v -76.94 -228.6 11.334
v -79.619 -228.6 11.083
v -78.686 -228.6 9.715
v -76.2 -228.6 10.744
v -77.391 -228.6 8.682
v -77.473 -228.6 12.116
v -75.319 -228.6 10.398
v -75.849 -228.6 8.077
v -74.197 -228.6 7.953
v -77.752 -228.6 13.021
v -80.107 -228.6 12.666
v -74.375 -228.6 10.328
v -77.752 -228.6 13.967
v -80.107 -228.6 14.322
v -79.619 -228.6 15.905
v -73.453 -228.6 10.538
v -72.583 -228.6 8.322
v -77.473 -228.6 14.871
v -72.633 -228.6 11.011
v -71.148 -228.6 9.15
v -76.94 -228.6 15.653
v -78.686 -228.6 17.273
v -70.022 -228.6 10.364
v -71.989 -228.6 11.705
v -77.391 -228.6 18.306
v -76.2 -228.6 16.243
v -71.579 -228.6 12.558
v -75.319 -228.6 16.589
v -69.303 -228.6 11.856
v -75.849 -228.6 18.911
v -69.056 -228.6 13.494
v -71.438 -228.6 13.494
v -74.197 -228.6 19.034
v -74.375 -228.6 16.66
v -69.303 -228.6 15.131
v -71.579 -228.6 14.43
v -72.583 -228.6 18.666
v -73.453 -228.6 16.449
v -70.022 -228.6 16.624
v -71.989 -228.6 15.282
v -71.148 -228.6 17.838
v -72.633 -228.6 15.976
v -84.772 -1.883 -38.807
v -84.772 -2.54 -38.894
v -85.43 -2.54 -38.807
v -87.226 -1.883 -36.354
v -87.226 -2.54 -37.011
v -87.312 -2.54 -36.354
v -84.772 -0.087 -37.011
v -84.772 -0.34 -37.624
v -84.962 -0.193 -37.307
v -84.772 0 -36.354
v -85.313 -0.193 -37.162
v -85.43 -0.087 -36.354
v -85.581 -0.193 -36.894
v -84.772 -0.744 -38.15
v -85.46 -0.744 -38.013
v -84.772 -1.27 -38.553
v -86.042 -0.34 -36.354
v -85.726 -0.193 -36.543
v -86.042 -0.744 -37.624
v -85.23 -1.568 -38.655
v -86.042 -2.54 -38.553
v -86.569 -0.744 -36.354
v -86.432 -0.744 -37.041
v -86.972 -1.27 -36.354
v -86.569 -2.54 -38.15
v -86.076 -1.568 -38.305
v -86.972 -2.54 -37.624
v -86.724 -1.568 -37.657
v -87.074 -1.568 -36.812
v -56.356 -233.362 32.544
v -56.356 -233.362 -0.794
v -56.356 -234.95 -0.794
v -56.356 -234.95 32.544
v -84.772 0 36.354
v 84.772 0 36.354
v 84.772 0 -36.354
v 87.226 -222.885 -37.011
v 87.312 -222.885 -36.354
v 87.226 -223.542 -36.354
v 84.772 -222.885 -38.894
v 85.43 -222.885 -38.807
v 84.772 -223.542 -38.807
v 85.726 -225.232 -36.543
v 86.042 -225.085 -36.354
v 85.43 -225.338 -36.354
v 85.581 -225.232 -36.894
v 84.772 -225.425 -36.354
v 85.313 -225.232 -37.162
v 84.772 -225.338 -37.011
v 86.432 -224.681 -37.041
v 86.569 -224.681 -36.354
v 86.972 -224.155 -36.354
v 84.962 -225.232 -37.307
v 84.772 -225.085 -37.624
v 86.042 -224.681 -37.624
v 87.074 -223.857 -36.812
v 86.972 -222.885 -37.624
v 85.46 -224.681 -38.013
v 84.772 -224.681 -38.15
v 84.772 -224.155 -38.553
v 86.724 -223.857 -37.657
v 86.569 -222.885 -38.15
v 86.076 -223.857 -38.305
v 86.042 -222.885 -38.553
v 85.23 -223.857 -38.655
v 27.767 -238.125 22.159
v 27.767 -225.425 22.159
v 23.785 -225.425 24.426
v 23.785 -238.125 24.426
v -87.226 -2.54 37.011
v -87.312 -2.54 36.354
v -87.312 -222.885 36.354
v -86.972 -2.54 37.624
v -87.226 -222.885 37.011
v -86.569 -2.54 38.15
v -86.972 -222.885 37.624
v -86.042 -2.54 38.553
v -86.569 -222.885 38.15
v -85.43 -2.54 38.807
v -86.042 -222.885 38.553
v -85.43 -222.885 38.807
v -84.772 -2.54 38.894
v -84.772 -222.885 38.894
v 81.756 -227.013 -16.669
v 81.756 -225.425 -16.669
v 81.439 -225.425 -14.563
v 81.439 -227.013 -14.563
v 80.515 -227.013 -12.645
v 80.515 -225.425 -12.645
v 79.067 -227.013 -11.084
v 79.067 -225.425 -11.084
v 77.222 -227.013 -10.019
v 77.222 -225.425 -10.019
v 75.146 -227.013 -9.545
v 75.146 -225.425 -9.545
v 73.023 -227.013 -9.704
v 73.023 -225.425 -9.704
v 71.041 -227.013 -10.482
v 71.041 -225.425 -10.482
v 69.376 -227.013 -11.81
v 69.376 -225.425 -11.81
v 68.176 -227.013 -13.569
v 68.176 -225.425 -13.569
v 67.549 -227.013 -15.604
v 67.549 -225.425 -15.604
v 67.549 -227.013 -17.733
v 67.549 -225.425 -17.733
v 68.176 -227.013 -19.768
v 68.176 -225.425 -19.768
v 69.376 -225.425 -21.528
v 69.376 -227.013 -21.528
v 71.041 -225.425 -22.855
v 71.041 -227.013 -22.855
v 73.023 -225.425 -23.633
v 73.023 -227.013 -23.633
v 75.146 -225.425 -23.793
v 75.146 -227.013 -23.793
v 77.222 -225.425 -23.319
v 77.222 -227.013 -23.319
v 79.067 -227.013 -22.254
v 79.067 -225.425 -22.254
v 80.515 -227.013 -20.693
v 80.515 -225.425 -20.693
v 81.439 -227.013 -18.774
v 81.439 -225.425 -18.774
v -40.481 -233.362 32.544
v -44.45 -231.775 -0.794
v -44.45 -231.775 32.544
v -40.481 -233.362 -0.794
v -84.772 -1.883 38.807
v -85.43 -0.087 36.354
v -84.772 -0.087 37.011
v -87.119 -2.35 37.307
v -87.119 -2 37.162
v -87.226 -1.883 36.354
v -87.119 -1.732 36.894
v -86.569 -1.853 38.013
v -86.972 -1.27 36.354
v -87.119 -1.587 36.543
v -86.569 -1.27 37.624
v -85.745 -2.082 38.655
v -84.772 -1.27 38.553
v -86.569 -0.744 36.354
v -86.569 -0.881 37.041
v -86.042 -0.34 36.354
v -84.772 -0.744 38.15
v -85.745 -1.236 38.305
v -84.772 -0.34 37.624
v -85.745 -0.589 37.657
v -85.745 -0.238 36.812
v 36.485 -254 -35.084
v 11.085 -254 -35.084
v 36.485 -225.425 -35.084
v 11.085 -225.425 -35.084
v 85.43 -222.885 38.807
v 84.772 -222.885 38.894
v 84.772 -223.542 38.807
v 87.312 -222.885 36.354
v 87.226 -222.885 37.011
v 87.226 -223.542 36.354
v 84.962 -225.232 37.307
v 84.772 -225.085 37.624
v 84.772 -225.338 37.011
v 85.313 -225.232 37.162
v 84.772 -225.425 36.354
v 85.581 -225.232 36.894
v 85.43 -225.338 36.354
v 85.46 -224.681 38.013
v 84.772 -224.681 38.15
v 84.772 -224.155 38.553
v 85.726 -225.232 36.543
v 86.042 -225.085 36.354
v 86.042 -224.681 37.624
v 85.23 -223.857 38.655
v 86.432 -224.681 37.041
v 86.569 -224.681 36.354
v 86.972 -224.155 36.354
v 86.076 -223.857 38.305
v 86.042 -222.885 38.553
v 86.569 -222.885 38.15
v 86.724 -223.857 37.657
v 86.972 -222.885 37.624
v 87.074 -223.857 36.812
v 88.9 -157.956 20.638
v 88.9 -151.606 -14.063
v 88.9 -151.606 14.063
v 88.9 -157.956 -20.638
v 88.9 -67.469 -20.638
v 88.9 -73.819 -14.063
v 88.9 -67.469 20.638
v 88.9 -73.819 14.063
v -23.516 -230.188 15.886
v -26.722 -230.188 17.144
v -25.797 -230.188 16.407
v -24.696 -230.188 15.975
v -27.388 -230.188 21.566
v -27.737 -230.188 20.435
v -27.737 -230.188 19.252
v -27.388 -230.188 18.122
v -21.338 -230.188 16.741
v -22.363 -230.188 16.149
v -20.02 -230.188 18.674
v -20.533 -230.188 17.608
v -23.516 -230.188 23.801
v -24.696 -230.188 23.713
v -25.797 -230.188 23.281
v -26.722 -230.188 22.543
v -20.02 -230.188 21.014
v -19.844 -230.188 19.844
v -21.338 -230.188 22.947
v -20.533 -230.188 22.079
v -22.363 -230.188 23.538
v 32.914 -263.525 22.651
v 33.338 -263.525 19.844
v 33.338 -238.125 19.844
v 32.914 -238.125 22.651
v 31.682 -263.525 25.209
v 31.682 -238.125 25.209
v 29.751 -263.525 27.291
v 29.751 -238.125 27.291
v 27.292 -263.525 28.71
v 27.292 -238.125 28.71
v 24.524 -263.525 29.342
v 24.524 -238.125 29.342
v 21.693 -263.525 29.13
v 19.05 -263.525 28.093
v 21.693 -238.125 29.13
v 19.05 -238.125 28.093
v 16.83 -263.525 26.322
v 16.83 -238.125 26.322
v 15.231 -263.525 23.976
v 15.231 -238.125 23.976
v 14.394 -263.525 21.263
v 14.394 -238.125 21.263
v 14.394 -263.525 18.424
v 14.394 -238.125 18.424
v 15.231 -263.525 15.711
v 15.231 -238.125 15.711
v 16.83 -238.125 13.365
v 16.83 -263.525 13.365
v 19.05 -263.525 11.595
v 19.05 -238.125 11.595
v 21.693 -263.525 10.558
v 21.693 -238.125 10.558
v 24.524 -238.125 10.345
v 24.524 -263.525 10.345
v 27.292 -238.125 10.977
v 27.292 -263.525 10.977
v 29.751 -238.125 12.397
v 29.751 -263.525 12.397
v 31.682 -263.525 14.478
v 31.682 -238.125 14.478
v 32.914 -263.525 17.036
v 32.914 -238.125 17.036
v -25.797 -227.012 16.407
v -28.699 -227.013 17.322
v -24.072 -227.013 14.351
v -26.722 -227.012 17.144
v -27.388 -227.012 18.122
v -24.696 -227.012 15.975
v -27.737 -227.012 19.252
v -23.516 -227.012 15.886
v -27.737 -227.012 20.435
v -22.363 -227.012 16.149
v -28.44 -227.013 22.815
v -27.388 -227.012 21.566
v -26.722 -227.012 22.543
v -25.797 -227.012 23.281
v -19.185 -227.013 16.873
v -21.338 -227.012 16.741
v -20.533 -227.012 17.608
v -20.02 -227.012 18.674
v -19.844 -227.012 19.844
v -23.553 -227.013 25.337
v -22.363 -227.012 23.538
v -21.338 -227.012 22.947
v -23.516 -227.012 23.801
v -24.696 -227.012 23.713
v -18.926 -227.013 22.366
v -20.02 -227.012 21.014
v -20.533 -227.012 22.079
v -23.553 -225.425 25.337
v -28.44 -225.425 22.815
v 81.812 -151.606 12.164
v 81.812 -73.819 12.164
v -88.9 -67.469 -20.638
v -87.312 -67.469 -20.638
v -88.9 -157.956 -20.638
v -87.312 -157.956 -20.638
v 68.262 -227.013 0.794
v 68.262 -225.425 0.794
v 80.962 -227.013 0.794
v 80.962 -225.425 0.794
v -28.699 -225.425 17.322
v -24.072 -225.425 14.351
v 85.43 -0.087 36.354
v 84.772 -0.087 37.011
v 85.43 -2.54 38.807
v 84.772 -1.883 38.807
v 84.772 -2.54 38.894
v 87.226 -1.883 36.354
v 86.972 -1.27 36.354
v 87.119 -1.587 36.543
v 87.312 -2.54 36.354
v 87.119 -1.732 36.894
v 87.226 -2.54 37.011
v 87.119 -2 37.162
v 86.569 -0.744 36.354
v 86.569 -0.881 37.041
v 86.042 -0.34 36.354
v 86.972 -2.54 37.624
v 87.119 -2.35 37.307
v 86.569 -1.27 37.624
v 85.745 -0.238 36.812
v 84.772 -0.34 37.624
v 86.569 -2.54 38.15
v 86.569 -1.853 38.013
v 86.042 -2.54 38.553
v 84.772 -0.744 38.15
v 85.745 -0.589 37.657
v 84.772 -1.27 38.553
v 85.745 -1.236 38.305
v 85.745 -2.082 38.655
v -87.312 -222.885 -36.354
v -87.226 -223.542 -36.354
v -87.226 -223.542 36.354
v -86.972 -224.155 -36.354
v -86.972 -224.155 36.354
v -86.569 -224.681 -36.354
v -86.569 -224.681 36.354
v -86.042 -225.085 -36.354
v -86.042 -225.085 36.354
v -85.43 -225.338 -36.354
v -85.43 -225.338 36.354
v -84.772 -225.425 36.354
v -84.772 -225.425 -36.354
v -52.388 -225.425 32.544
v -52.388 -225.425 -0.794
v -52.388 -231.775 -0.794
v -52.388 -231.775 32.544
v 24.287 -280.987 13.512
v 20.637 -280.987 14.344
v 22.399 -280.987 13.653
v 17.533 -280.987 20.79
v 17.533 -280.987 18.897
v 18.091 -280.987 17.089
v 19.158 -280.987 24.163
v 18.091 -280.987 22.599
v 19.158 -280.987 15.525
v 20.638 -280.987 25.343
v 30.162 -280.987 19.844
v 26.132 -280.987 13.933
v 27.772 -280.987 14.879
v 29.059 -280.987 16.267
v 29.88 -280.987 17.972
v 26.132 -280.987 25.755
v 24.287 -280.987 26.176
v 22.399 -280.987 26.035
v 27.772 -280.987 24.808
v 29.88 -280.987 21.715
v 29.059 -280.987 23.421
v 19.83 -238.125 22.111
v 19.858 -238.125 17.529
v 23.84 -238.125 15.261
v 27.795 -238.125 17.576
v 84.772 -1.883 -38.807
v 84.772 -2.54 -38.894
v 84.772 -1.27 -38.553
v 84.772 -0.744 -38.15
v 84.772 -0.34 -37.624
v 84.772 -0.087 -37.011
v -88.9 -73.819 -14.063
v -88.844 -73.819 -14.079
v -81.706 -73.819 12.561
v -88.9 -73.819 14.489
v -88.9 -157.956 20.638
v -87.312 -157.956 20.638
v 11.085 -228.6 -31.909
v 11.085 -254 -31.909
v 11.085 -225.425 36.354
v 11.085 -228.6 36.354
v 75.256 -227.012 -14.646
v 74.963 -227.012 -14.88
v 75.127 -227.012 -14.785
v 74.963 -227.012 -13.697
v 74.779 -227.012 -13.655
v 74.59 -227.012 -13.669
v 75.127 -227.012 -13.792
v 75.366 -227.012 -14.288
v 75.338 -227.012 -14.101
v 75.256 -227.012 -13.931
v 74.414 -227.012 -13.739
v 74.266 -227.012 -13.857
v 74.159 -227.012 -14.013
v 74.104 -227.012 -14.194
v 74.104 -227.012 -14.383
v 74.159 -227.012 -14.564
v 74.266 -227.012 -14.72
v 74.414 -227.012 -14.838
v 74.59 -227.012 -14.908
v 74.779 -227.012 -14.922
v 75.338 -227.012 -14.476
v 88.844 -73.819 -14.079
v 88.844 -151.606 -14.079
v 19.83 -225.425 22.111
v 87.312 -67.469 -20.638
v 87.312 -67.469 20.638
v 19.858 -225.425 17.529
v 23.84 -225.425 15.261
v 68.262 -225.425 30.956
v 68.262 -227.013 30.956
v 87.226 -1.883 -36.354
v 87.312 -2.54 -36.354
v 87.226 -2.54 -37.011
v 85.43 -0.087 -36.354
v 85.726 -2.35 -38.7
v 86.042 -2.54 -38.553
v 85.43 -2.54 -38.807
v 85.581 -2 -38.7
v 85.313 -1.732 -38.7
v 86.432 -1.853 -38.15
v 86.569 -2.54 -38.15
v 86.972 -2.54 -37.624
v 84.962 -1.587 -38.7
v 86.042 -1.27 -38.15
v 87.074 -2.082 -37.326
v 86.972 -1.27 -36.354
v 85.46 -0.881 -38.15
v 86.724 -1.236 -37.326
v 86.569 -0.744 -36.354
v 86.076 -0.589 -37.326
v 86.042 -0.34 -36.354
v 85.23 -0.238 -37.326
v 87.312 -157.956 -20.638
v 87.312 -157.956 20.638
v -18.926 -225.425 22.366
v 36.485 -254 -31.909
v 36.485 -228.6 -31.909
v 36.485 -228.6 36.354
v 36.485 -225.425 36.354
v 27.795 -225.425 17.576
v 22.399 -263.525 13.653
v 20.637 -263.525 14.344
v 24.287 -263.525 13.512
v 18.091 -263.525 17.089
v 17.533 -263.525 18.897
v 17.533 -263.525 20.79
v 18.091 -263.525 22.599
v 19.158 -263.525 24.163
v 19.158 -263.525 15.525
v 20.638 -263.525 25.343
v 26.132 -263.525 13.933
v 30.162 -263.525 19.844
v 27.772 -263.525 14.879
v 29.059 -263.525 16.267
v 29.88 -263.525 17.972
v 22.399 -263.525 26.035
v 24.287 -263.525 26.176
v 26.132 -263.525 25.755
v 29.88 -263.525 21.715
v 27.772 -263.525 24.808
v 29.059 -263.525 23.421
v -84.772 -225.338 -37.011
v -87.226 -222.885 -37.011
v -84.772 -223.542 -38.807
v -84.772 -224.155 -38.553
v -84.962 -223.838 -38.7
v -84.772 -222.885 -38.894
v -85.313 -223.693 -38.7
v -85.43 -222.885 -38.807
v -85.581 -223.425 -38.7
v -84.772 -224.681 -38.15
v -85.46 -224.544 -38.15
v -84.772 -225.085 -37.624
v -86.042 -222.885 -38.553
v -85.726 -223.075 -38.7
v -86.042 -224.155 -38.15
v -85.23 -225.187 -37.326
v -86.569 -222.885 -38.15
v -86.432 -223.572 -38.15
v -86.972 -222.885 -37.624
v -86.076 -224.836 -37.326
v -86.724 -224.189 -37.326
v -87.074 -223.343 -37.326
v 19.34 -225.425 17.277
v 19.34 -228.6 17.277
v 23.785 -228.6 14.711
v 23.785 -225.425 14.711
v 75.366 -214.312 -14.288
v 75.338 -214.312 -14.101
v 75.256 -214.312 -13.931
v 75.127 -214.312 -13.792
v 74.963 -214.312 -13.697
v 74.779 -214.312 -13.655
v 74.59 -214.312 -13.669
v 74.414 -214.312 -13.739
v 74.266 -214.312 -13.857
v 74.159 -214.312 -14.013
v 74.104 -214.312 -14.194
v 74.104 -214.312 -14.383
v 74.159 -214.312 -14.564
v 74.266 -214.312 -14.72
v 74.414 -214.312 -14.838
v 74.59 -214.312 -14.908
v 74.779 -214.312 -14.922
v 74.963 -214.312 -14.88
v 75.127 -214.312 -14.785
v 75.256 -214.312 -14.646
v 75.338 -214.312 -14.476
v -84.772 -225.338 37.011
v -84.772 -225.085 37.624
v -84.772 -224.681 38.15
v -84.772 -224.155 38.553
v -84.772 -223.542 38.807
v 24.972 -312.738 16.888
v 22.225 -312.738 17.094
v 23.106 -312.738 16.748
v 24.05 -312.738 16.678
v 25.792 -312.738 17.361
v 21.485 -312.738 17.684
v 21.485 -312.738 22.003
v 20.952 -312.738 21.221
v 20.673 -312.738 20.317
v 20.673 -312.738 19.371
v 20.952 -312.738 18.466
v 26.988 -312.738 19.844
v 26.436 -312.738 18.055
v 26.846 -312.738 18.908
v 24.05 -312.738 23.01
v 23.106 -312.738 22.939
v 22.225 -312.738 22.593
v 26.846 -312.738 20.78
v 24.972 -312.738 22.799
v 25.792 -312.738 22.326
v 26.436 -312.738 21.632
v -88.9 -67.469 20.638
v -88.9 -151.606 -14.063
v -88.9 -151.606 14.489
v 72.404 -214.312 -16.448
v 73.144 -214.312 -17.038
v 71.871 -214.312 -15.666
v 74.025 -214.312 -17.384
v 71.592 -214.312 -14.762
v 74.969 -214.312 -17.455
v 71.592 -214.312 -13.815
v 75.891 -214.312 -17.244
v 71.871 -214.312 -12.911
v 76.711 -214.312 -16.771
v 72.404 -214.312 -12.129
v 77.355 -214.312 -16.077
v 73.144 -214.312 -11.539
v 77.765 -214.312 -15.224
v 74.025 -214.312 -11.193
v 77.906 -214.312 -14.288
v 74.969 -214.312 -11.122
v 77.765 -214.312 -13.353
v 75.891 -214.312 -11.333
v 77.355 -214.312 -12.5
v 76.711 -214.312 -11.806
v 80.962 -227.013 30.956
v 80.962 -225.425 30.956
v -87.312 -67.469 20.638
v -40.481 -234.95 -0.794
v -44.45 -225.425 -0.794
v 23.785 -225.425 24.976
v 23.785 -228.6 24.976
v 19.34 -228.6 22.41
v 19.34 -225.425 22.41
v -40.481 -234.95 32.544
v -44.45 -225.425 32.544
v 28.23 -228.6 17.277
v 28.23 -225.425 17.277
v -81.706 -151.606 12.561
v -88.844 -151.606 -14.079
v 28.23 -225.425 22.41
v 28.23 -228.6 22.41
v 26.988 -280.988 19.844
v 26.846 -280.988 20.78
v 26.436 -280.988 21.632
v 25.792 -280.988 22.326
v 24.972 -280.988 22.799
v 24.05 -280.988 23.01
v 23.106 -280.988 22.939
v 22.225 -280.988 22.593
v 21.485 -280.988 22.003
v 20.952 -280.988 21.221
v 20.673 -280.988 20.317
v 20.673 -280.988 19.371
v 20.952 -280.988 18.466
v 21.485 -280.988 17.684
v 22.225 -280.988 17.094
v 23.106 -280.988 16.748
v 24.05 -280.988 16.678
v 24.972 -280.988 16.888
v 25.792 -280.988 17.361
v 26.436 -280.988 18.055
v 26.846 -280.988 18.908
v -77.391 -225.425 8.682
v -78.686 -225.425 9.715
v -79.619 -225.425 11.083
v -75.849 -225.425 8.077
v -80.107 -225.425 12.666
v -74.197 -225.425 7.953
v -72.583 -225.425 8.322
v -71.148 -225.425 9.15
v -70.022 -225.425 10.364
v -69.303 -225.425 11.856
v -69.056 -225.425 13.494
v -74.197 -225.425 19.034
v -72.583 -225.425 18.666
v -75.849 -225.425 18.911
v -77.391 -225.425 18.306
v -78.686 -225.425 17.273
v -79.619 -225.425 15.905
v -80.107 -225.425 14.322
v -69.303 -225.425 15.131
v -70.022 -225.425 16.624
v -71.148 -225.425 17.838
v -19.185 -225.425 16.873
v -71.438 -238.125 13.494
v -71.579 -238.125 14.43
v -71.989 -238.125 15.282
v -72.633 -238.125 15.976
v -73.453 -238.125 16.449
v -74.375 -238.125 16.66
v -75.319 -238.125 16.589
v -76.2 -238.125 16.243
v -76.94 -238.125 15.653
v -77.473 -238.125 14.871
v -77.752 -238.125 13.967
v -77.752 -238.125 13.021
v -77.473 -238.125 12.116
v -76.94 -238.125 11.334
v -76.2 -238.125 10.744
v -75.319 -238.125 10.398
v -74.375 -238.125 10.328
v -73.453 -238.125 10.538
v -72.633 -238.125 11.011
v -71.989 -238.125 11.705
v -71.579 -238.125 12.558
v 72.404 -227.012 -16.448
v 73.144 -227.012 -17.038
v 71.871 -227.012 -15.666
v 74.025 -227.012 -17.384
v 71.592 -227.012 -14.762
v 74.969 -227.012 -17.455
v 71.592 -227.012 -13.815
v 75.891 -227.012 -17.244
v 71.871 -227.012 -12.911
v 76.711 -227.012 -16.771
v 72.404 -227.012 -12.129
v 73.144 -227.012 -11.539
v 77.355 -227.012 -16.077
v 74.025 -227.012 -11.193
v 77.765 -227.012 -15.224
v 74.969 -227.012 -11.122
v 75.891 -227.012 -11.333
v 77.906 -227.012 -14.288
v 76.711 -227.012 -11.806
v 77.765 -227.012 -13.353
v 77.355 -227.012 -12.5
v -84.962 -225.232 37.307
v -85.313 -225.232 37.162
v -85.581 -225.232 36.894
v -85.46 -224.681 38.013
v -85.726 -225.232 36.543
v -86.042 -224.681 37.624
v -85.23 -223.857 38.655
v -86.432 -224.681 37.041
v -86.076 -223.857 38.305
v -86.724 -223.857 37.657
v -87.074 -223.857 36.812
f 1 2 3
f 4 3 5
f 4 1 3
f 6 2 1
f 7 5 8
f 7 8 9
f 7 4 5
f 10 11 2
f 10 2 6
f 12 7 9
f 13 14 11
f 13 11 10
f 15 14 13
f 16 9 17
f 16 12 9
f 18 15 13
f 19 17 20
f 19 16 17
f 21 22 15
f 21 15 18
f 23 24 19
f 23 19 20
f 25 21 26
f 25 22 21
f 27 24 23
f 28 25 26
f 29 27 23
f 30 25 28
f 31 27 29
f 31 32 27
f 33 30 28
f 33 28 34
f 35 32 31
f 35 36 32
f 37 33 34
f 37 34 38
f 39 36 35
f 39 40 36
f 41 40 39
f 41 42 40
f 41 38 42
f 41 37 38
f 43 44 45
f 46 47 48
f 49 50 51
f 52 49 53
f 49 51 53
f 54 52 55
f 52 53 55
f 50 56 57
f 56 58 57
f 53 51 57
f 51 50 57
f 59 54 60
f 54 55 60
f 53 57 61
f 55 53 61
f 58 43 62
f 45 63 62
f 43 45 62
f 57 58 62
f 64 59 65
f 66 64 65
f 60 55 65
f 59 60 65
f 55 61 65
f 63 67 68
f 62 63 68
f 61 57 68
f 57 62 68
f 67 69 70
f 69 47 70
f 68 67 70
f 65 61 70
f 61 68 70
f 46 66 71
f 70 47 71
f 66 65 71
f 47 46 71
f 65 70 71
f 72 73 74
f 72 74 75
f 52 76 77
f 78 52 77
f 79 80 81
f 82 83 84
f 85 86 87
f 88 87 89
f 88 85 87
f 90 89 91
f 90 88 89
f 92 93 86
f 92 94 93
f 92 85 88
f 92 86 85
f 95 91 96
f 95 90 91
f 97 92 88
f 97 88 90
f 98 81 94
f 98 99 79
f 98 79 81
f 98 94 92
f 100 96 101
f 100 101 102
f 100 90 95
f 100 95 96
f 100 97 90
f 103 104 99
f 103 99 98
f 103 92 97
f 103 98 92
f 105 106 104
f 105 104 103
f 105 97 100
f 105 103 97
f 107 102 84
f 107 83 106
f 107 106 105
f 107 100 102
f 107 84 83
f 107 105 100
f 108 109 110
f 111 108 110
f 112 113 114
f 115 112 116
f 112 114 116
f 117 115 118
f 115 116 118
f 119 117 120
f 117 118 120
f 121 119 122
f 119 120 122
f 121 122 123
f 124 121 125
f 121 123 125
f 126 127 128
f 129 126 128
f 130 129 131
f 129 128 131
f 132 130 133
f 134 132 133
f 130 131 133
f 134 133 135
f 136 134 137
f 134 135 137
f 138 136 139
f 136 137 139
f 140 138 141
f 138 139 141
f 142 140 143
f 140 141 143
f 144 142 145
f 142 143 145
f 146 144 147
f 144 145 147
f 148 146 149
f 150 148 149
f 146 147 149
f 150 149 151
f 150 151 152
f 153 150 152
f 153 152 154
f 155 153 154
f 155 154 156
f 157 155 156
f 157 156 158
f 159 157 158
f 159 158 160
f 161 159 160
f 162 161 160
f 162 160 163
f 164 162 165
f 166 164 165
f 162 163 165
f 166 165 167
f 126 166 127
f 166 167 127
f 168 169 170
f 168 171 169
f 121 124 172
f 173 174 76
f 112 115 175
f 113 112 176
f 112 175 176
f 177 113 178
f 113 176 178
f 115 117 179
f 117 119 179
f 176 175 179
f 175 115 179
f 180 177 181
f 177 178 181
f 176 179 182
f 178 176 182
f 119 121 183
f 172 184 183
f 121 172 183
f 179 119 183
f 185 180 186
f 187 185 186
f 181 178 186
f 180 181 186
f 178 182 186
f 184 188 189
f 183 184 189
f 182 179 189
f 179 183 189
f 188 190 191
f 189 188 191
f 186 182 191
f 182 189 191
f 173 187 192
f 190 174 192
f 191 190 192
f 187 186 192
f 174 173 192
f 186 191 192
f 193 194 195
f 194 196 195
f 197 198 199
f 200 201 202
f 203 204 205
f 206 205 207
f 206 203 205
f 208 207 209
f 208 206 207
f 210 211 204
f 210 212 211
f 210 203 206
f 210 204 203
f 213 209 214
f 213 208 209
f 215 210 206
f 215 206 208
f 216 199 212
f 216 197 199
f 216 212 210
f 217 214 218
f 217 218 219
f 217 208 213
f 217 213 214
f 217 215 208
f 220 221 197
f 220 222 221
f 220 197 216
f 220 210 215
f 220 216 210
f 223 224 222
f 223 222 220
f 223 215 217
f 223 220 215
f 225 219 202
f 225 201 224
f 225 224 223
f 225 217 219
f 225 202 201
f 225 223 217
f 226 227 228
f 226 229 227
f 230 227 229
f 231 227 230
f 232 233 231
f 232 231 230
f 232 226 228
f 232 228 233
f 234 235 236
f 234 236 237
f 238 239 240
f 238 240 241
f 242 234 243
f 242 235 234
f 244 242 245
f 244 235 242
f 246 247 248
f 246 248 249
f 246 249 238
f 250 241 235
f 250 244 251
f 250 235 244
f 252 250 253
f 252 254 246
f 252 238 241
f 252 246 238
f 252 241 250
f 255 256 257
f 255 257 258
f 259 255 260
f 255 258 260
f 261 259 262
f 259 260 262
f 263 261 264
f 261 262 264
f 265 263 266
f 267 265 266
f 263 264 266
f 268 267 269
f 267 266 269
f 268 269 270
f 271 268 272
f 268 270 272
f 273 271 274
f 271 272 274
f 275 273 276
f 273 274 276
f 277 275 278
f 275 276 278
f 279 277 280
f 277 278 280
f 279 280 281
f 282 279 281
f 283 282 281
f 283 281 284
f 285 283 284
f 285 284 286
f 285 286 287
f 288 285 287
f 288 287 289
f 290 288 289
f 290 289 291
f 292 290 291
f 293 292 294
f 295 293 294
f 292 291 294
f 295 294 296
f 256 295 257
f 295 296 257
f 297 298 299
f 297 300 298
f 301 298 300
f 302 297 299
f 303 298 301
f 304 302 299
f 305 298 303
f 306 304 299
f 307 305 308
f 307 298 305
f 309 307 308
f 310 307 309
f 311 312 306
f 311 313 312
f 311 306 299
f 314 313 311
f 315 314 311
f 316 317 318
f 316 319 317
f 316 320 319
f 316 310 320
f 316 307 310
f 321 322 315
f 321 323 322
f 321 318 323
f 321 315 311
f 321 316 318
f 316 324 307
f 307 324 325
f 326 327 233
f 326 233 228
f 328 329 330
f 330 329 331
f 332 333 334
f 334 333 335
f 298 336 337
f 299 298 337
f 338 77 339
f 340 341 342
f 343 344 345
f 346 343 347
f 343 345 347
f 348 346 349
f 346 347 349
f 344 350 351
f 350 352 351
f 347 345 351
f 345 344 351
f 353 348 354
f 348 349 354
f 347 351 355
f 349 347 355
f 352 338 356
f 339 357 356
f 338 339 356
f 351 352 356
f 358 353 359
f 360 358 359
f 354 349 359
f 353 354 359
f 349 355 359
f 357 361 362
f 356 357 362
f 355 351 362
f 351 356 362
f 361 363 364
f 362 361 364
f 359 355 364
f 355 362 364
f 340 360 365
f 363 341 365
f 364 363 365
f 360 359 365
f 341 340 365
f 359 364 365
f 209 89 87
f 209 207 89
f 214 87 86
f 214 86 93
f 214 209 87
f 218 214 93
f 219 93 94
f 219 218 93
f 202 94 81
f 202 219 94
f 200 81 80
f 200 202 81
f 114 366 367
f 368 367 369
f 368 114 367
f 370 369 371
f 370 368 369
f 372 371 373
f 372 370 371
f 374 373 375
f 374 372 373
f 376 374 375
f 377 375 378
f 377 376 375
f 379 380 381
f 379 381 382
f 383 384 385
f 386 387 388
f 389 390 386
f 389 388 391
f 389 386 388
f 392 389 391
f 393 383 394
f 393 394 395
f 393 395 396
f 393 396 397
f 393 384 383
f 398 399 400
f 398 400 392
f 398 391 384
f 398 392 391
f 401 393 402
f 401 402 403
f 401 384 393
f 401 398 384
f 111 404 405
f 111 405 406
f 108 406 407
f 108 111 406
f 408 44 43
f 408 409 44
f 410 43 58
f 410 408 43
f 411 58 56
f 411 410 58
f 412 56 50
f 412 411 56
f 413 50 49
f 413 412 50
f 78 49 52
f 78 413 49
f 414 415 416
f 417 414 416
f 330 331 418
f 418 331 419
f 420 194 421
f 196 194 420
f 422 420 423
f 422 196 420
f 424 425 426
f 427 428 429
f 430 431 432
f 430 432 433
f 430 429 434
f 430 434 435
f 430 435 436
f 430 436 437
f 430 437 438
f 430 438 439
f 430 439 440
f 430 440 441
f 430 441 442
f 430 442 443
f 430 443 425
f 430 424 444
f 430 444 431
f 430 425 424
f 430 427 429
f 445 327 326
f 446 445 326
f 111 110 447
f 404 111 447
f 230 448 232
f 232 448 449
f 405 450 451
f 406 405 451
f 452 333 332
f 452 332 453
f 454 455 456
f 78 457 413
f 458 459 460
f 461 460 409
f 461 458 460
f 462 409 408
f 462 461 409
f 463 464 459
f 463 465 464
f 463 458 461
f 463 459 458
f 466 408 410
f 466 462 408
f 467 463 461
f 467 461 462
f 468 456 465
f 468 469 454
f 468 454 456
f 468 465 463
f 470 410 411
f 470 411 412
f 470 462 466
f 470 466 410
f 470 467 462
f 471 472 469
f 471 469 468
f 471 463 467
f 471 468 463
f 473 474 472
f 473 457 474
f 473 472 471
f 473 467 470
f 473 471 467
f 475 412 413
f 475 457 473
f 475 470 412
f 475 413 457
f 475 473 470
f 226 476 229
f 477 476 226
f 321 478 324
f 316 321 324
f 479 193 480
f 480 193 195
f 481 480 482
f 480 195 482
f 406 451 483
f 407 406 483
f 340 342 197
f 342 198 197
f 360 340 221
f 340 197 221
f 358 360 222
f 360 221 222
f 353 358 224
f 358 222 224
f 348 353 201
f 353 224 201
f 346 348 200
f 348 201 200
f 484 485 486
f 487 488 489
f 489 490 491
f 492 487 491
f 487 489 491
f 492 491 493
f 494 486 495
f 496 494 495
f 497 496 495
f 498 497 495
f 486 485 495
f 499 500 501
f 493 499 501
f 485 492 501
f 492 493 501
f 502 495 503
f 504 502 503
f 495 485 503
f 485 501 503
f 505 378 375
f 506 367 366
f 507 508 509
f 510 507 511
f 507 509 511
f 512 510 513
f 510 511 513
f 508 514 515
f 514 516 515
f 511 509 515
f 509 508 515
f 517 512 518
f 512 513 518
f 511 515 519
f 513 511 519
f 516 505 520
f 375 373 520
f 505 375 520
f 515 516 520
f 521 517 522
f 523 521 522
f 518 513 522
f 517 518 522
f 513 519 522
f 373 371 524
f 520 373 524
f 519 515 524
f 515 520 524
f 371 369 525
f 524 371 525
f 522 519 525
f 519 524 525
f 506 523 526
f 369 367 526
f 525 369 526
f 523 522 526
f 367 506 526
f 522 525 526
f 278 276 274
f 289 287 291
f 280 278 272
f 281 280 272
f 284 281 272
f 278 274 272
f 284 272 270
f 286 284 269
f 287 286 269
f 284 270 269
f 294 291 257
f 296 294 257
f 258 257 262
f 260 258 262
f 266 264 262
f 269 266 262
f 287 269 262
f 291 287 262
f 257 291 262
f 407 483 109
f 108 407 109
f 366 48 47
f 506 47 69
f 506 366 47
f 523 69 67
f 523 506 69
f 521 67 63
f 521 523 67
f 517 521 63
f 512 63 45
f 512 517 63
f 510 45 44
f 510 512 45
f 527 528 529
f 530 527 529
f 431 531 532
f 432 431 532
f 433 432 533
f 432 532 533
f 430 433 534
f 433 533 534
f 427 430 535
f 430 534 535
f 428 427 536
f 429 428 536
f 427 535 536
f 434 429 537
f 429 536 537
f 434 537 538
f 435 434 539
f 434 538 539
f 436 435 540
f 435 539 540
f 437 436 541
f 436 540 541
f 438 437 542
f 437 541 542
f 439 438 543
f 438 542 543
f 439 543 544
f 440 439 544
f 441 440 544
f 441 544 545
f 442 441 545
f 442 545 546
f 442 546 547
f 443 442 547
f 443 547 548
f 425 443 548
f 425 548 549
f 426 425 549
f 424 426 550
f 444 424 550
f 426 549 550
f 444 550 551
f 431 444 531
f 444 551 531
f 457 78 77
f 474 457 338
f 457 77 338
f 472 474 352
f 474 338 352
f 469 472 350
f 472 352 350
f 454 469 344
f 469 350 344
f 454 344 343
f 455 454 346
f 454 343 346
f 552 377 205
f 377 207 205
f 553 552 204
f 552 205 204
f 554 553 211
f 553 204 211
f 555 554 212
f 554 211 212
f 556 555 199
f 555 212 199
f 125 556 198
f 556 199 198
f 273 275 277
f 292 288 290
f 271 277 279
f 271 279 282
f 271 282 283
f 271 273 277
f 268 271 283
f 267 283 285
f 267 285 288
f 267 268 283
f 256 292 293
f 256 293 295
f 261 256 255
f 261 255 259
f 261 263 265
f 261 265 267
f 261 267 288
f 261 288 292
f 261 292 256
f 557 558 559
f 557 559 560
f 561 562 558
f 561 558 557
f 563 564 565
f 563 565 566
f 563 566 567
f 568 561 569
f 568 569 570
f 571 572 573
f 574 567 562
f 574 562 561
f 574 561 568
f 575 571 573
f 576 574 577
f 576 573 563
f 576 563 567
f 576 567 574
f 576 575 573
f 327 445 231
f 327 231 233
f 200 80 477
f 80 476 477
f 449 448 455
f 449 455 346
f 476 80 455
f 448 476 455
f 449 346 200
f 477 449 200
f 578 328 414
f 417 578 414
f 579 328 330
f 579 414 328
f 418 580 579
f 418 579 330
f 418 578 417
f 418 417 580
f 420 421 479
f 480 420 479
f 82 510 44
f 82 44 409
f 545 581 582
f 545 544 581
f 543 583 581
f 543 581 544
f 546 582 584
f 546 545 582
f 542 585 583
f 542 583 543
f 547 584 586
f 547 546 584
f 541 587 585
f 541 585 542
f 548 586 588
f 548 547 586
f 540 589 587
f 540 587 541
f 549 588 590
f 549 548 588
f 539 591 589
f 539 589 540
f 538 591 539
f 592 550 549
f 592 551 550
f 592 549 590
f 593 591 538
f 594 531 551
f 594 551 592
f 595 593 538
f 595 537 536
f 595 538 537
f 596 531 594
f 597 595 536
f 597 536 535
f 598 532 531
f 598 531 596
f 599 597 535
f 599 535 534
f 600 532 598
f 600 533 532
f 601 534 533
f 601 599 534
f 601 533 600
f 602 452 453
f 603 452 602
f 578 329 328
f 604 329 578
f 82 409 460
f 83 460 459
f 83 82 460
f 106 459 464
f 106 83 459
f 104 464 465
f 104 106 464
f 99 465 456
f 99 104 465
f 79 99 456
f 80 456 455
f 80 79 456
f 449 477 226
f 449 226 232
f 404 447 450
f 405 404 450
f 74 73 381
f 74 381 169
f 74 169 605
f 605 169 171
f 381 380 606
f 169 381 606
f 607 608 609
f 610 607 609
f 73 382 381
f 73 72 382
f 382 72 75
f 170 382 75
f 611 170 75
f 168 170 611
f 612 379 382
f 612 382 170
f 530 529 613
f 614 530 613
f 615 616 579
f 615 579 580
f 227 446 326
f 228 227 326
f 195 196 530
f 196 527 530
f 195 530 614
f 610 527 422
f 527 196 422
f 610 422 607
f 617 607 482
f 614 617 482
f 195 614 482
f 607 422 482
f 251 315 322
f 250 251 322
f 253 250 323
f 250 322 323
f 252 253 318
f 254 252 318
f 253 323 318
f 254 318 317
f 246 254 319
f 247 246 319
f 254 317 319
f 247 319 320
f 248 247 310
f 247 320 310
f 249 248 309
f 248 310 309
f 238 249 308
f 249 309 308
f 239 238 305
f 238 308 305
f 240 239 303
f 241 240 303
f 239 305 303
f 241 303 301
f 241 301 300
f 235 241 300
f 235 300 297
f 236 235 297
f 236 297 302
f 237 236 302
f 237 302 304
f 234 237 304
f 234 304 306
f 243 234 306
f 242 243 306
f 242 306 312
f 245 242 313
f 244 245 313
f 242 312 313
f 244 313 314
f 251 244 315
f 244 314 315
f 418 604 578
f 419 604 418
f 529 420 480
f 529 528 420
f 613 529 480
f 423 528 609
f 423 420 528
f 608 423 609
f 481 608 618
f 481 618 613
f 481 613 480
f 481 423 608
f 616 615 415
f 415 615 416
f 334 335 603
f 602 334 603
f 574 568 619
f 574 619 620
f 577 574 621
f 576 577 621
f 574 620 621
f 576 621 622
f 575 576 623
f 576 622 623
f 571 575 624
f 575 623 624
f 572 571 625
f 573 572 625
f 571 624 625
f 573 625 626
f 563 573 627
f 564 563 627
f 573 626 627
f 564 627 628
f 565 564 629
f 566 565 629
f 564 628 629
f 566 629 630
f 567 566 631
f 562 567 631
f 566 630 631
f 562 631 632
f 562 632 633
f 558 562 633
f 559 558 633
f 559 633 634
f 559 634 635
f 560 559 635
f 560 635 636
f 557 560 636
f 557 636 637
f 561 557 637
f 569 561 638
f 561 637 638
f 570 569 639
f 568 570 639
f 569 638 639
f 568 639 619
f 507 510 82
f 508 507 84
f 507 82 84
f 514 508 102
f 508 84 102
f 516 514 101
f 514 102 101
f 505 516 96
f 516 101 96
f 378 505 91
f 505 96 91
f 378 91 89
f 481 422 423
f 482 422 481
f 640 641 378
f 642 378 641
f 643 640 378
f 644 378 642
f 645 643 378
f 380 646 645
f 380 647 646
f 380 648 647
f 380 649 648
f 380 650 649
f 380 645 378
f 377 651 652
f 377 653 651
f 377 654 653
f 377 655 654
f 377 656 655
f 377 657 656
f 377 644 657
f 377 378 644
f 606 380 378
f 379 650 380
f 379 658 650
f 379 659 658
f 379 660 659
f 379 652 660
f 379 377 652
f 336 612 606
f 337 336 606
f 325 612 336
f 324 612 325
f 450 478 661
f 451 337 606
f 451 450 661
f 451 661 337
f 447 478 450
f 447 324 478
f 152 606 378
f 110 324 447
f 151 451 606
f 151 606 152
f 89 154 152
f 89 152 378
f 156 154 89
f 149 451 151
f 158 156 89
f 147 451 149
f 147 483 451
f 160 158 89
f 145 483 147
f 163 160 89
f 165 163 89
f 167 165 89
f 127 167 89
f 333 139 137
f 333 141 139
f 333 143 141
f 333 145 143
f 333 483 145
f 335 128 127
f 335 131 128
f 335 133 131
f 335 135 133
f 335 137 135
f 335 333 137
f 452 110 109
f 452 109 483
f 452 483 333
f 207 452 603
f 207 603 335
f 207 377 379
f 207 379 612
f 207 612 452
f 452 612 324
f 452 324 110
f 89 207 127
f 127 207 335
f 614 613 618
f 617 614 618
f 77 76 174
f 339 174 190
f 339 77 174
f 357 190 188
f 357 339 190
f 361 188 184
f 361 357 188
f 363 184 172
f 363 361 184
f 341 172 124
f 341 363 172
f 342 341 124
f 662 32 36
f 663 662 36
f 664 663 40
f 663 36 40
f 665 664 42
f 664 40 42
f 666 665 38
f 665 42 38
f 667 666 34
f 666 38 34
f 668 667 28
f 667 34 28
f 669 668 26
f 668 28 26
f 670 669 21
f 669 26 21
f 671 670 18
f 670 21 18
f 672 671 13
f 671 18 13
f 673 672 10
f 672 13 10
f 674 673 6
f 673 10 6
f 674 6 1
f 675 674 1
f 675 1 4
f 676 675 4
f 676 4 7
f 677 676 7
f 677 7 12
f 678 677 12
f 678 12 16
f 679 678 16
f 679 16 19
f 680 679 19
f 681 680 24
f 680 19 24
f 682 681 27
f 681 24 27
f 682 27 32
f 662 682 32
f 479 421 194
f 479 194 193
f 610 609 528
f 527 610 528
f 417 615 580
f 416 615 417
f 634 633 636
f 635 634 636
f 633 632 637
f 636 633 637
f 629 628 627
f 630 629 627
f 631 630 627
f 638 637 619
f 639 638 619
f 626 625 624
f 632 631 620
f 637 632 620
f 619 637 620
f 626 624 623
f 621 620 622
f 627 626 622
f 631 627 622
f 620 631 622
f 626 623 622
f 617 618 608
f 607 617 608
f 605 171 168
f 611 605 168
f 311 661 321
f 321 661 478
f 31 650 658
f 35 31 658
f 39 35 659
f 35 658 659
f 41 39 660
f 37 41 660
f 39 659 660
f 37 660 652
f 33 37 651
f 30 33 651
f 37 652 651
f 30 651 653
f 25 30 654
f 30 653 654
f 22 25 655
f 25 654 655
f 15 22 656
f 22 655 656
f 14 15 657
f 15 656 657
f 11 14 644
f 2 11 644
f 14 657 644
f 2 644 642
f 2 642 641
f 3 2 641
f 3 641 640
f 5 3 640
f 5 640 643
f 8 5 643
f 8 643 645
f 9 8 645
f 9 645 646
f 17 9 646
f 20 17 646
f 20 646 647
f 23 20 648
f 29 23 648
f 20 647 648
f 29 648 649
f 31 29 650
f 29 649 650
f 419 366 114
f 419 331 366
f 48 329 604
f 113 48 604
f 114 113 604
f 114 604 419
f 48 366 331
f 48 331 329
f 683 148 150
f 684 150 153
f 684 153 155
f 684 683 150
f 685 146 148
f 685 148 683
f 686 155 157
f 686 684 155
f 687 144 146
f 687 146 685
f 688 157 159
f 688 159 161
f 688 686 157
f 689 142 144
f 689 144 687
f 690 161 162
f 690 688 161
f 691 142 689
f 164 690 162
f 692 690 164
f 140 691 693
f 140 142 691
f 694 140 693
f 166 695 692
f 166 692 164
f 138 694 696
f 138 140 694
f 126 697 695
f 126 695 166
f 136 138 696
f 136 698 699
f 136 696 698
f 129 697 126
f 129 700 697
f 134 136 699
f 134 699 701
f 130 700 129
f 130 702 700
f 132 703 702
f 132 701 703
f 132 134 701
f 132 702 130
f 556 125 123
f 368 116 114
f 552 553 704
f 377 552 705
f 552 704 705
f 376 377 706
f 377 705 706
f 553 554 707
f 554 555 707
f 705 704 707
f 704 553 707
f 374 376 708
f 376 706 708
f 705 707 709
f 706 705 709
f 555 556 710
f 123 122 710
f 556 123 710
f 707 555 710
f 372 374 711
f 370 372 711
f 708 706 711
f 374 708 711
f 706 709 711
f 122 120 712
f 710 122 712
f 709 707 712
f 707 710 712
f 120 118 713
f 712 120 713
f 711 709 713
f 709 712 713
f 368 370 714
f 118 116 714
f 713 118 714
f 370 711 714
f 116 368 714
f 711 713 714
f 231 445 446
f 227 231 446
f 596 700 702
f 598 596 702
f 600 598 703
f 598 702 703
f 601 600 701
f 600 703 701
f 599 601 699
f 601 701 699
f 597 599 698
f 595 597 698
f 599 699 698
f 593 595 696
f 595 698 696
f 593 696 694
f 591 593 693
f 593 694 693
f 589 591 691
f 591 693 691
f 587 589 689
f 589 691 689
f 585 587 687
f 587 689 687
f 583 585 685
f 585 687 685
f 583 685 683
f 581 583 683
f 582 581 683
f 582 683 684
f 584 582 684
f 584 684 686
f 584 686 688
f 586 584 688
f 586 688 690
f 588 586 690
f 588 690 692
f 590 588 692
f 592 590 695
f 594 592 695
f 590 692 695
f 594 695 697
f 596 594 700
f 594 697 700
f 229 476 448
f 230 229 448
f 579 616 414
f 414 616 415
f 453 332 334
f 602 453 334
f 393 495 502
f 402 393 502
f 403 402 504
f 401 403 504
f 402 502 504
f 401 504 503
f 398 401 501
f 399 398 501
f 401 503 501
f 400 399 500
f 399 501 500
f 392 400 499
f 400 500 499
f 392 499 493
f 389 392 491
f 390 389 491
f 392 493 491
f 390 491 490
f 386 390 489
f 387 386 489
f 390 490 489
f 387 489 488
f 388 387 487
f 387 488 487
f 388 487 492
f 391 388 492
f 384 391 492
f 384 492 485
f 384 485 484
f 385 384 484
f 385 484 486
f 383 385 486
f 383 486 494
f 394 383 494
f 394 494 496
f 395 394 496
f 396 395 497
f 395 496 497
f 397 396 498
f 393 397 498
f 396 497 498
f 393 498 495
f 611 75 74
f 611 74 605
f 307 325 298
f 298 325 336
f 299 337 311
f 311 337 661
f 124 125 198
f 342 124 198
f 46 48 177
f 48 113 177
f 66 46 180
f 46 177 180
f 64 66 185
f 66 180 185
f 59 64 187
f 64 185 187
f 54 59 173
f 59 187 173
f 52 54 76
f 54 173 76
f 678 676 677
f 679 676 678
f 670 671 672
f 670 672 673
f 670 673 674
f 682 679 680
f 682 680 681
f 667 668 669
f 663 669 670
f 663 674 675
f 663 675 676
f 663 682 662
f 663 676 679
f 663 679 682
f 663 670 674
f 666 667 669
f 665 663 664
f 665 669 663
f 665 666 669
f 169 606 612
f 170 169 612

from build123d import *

# Parameters (mm, degrees)
F0_W       = 174.625
F0_H       = 77.7875
F1_DEPTH   = 225.425
F2_W       = 90.4875
F2_H       = 41.275
F3_DEPTH   = 1.5875
F4_W       = 90.4875
F4_H       = 41.275
F5_DEPTH   = 1.5875
F6_R       = 2.54
F9_W       = 77.7875
F9_H       = 27.5794637142
F10_DEPTH  = 25.4
F13_W      = 77.7875
F13_H      = 27.1685884801
F14_DEPTH  = 25.4
F15_R      = 7.14375
F16_DEPTH  = 1.5875
F17_R      = 3.175
F18_DEPTH  = 12.7
F19_R      = 0.635
F20_DEPTH  = 12.7
F21_W      = 12.7
F21_H      = 30.1625
F22_DEPTH  = 1.5875
F24_DEPTH  = 12.7
F25_R      = 9.525
F26_DEPTH  = 25.4
F27_R      = 6.35
F28_DEPTH  = 17.4625
F29_R      = 3.175
F30_DEPTH  = 31.75
F32_DEPTH  = 1.5875
F33_R      = 3.96875
F34_DEPTH  = 3.175
F35_W      = 7.9375
F35_H      = 33.3375
F36_DEPTH  = 6.35
F36_FACE_W = 7.9375
F36_FACE_H = 33.3375
F38_W      = 15.875
F38_H      = 33.3375
F40_W      = 15.875
F40_H      = 33.3375
F41_DEPTH  = 1.5875
F42_R      = 5.55625
F43_DEPTH  = 3.175
F44_R      = 3.175
F45_DEPTH  = 9.525
F46_W      = 25.4
F46_H      = 71.4375
F47_DEPTH  = 3.175
F49_DEPTH  = 228.601
F50_W      = 25.4
F50_H      = 3.175
F51_DEPTH  = 25.4


with BuildPart() as f1:
    # F0 (on Front) → F1 (new body)
    with BuildSketch(Plane.XZ):
        Rectangle(F0_W, F0_H)
    extrude(amount=F1_DEPTH)

    # F2 (on face) → F3 (join)
    with BuildSketch(Plane(origin=(-87.3125, 0, 0), x_dir=(0, -1, 0), z_dir=(-1, 0, 0))):
        with Locations((112.7125, 0)):
            Rectangle(F2_W, F2_H)
    extrude(amount=F3_DEPTH)

    # F4 (on face) → F5 (join)
    with BuildSketch(Plane.YZ.offset(87.3125)):
        with Locations((-112.7125, 0)):
            Rectangle(F4_W, F4_H)
    extrude(amount=F5_DEPTH)

    # F6
    f6_edges = [f1.edges().sort_by_distance(p)[0] for p in [
        (0, 0, 38.89375),
        (87.3125, 0, 0),
        (87.3125, -112.7125, 38.89375),
        (87.3125, -112.7125, -38.89375),
        (-87.3125, -112.7125, 38.89375),
        (0, -225.425, 38.89375),
        (87.3125, -225.425, 0),
        (-87.3125, -225.425, 0),
        (0, -225.425, -38.89375),
        (-87.3125, -112.7125, -38.89375),
        (0, 0, -38.89375),
        (-87.3125, 0, 0),
    ]]
    fillet(f6_edges, radius=F6_R)

    # F9 (on face) → F10 (cut)
    with BuildSketch(Plane(origin=(-79.3729541982, 0, 21.2679189783), x_dir=(0, 1, 0), z_dir=(0.9659258263, 0, -0.2588190451))):
        with Locations((-112.7125, -22.8035754926)):
            Rectangle(F9_W, F9_H)
    extrude(amount=-F10_DEPTH, mode=Mode.SUBTRACT)

    # F13 (on face) → F14 (cut)
    with BuildSketch(Plane(origin=(79.3729541982, 0, 21.2679189783), x_dir=(0, -1, 0), z_dir=(-0.9659258263, 0, -0.2588190451))):
        with Locations((112.7125, -23.0090131096)):
            Rectangle(F13_W, F13_H)
    extrude(amount=-F14_DEPTH, mode=Mode.SUBTRACT)

    # F15 (on face) → F16 (join)
    with BuildSketch(Plane.XZ.offset(225.425)):
        with Locations((74.6125, -16.66875)):
            Circle(F15_R)
    extrude(amount=F16_DEPTH)

    # F17 (on face) → F18 (cut)
    with BuildSketch(Plane.XZ.offset(227.0125)):
        with Locations((74.7314542532, -14.2884904529)):
            Circle(F17_R)
    extrude(amount=-F18_DEPTH, mode=Mode.SUBTRACT)

    # F19 (on face) → F20 (join)
    with BuildSketch(Plane.XZ.offset(214.3125)):
        with Locations((74.7314542532, -14.2884904529)):
            Circle(F19_R)
    extrude(amount=F20_DEPTH)

    # F21 (on face) → F22 (join)
    with BuildSketch(Plane.XZ.offset(225.425)):
        with Locations((74.6125, 15.875)):
            Rectangle(F21_W, F21_H)
    extrude(amount=F22_DEPTH)

    # F23 (on face) → F24 (join)
    with BuildSketch(Plane.XZ.offset(225.425)):
        Polygon((23.839955207, 15.2611144816), (27.7949063788, 17.5762091475), (27.7674511717, 22.158844666), (23.785044793, 24.4263855184), (19.8300936212, 22.1112908525), (19.8575488283, 17.528655334), align=None)
    extrude(amount=F24_DEPTH)

    # F31 (on face) → F32 (join)
    with BuildSketch(Plane.XZ.offset(225.425)):
        Polygon((-24.0715896818, 14.350595393), (-19.1848334043, 16.8727944502), (-18.9257437225, 22.3659490572), (-23.5534103182, 25.336904607), (-28.4401665957, 22.8147055498), (-28.6992562775, 17.3215509428), align=None)
    extrude(amount=F32_DEPTH)

    # F33 (on face) → F34 (join)
    with BuildSketch(Plane.XZ.offset(227.0125)):
        with Locations((-23.8125, 19.84375)):
            Circle(F33_R)
    extrude(amount=F34_DEPTH)

    # F35 (on face) → F36 (join)
    with BuildSketch(Plane.XZ.offset(225.425)):
        with Locations((-48.41875, 15.875)):
            Rectangle(F35_W, F35_H)
    extrude(amount=F36_DEPTH)

    # F36_face (on face) → F39 section 0
    with BuildSketch(Plane(origin=(-48.41875, -231.775, 15.875), x_dir=(1, 0, 0), z_dir=(0, -1, 0))):
        Rectangle(F36_FACE_W, F36_FACE_H)
    # F38 (on offset) → F39 section 1
    with BuildSketch(Plane.XZ.offset(233.3625)):
        with Locations((-48.41875, 15.875)):
            Rectangle(F38_W, F38_H)
    loft()

    # F40 (on face) → F41 (join)
    with BuildSketch(Plane.XZ.offset(233.3625)):
        with Locations((-48.41875, 15.875)):
            Rectangle(F40_W, F40_H)
    extrude(amount=F41_DEPTH)

    # F42 (on face) → F43 (join)
    with BuildSketch(Plane.XZ.offset(225.425)):
        with Locations((-74.6125, 13.49375)):
            Circle(F42_R)
    extrude(amount=F43_DEPTH)

    # F44 (on face) → F45 (join)
    with BuildSketch(Plane.XZ.offset(228.6)):
        with Locations((-74.6125, 13.49375)):
            Circle(F44_R)
    extrude(amount=F45_DEPTH)


with BuildPart() as f26:
    # F25 (on face) → F26 (new body)
    with BuildSketch(Plane.XZ.offset(238.125)):
        with Locations((23.8125, 19.84375)):
            Circle(F25_R)
    extrude(amount=F26_DEPTH)


with BuildPart() as f28:
    # F27 (on face) → F28 (new body)
    with BuildSketch(Plane.XZ.offset(263.525)):
        with Locations((23.8125, 19.84375)):
            Circle(F27_R)
    extrude(amount=F28_DEPTH)


with BuildPart() as f30:
    # F29 (on face) → F30 (new body)
    with BuildSketch(Plane.XZ.offset(280.9875)):
        with Locations((23.8125, 19.84375)):
            Circle(F29_R)
    extrude(amount=F30_DEPTH)


with BuildPart() as f47:
    # F46 (on face) → F47 (new body)
    with BuildSketch(Plane.XZ.offset(225.425)):
        with Locations((23.785044793, 0.635)):
            Rectangle(F46_W, F46_H)
    extrude(amount=F47_DEPTH)

    # F48 (on face) → F49 (cut, through all)
    with BuildSketch(Plane.XZ.offset(228.6)):
        Polygon((23.785044793, 14.7111061069), (28.230044793, 17.2774280535), (28.230044793, 22.4100719465), (23.785044793, 24.9763938931), (19.340044793, 22.4100719465), (19.340044793, 17.2774280535), align=None)
    extrude(amount=-F49_DEPTH, mode=Mode.SUBTRACT)

    # F50 (on face) → F51 (join)
    with BuildSketch(Plane.XZ.offset(228.6)):
        with Locations((23.785044793, -33.49625)):
            Rectangle(F50_W, F50_H)
    extrude(amount=F51_DEPTH)


solid = Compound([f1.part, f26.part, f28.part, f30.part, f47.part])
